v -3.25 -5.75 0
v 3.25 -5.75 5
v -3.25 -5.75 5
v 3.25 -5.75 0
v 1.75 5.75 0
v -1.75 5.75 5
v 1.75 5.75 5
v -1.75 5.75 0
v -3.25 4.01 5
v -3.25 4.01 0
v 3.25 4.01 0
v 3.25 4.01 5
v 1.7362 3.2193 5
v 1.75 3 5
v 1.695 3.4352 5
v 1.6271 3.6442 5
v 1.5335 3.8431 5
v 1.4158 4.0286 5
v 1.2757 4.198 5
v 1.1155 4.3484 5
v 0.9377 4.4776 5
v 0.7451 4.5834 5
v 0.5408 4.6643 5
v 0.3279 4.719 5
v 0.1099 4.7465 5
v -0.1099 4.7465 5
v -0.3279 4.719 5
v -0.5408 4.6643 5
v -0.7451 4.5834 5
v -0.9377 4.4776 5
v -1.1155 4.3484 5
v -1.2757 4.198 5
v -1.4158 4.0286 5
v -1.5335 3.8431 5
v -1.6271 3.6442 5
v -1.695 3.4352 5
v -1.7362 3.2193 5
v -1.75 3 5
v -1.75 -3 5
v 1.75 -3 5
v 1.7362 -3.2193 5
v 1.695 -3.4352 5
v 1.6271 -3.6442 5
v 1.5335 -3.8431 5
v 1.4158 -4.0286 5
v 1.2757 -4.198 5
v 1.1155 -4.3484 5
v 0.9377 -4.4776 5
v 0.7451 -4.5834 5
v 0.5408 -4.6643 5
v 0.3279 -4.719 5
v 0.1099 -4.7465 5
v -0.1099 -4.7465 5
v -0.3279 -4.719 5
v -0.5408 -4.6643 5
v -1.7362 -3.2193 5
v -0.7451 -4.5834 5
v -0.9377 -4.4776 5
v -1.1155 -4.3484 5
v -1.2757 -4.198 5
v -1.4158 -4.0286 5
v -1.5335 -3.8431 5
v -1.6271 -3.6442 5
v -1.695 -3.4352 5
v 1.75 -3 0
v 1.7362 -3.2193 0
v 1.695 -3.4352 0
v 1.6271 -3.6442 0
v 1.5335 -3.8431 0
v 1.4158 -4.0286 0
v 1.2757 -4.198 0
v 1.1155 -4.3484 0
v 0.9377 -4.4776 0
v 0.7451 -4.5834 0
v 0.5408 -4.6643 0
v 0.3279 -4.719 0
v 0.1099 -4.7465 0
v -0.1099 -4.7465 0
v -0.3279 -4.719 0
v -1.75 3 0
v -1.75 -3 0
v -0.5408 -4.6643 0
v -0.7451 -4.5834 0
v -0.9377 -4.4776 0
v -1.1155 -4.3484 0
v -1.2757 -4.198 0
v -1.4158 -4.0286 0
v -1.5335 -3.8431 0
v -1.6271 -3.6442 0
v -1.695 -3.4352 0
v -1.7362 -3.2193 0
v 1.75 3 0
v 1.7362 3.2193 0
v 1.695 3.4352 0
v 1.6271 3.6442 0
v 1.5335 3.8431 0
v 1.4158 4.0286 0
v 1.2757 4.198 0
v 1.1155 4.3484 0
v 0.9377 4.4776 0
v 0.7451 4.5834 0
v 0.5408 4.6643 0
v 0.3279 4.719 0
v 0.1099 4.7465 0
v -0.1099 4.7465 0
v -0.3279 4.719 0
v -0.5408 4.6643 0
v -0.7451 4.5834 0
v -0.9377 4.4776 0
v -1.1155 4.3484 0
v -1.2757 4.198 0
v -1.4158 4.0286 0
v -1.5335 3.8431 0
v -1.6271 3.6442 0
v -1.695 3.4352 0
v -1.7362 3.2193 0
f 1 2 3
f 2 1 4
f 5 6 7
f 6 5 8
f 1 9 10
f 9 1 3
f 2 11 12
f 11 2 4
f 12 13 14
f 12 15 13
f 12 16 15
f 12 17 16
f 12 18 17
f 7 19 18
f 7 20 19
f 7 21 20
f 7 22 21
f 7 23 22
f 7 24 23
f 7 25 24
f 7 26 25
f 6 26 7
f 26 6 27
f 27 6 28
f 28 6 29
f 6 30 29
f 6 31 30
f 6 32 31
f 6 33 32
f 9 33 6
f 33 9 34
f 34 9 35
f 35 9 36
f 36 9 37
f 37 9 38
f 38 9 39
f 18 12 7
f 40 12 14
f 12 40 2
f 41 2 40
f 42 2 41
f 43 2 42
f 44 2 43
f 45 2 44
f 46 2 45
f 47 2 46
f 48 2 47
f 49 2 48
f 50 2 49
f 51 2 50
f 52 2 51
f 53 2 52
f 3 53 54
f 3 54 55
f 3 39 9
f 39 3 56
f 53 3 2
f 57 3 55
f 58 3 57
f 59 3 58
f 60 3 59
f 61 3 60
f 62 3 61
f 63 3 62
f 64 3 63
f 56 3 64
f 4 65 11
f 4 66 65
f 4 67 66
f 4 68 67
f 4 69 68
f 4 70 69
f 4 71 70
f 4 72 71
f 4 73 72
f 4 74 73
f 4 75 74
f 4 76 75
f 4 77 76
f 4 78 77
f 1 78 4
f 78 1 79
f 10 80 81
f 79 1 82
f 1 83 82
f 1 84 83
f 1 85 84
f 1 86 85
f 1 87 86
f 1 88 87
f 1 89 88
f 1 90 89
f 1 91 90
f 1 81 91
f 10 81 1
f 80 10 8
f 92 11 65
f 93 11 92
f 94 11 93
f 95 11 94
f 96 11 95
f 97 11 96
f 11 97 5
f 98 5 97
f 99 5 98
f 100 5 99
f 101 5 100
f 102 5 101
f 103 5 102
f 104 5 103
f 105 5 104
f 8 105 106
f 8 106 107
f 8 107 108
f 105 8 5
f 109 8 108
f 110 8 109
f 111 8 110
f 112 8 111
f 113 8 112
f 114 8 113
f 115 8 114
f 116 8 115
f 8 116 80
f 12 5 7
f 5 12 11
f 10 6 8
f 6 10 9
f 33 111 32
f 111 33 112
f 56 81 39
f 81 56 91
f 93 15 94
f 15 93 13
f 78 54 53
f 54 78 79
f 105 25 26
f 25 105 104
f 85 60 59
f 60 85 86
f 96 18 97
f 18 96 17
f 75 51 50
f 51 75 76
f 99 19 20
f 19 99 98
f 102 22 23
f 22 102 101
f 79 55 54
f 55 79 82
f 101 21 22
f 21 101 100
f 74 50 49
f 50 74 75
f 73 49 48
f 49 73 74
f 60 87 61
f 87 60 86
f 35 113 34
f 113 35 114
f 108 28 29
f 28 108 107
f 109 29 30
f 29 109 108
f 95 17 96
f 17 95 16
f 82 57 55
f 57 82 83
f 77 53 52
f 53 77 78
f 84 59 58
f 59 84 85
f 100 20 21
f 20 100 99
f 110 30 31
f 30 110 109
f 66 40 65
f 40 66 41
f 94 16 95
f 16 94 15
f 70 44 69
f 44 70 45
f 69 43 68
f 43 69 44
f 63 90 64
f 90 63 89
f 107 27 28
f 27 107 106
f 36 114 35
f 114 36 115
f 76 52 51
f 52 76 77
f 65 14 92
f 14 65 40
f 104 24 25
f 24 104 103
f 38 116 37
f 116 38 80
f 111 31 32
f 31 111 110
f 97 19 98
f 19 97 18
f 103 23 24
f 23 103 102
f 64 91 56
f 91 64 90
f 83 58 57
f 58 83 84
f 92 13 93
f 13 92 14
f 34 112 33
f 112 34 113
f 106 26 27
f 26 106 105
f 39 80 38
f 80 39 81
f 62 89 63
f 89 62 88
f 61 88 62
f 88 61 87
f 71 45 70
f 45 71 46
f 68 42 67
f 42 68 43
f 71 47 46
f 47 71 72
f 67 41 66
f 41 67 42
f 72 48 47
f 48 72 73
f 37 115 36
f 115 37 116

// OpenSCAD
FW_TOP_WIDTH = 3.5;
FW_TOP_LENGTH = 11.5;
FW_BOT_WIDTH = 6.5;
FW_BOT_LENGTH = 9.76;

USB_WIDTH = 9.5;
USB_DIA = 3.5;

HEIGHT = 5;

$fn = 50;

difference() {
  hull() {
    translate([-FW_TOP_WIDTH/2, -FW_TOP_LENGTH/2, 0])
    cube(size = [FW_TOP_WIDTH, FW_TOP_LENGTH, HEIGHT]);

    translate([-FW_BOT_WIDTH/2, -FW_TOP_LENGTH/2, 0])
    cube(size = [FW_BOT_WIDTH, FW_BOT_LENGTH, HEIGHT]);
  }

  #hull() {
    translate([0, -(USB_WIDTH-USB_DIA)/2, 0])
    cylinder(d = USB_DIA, h = HEIGHT);
    translate([0, (USB_WIDTH-USB_DIA)/2, 0])
    cylinder(d = USB_DIA, h = HEIGHT);
  }
}
